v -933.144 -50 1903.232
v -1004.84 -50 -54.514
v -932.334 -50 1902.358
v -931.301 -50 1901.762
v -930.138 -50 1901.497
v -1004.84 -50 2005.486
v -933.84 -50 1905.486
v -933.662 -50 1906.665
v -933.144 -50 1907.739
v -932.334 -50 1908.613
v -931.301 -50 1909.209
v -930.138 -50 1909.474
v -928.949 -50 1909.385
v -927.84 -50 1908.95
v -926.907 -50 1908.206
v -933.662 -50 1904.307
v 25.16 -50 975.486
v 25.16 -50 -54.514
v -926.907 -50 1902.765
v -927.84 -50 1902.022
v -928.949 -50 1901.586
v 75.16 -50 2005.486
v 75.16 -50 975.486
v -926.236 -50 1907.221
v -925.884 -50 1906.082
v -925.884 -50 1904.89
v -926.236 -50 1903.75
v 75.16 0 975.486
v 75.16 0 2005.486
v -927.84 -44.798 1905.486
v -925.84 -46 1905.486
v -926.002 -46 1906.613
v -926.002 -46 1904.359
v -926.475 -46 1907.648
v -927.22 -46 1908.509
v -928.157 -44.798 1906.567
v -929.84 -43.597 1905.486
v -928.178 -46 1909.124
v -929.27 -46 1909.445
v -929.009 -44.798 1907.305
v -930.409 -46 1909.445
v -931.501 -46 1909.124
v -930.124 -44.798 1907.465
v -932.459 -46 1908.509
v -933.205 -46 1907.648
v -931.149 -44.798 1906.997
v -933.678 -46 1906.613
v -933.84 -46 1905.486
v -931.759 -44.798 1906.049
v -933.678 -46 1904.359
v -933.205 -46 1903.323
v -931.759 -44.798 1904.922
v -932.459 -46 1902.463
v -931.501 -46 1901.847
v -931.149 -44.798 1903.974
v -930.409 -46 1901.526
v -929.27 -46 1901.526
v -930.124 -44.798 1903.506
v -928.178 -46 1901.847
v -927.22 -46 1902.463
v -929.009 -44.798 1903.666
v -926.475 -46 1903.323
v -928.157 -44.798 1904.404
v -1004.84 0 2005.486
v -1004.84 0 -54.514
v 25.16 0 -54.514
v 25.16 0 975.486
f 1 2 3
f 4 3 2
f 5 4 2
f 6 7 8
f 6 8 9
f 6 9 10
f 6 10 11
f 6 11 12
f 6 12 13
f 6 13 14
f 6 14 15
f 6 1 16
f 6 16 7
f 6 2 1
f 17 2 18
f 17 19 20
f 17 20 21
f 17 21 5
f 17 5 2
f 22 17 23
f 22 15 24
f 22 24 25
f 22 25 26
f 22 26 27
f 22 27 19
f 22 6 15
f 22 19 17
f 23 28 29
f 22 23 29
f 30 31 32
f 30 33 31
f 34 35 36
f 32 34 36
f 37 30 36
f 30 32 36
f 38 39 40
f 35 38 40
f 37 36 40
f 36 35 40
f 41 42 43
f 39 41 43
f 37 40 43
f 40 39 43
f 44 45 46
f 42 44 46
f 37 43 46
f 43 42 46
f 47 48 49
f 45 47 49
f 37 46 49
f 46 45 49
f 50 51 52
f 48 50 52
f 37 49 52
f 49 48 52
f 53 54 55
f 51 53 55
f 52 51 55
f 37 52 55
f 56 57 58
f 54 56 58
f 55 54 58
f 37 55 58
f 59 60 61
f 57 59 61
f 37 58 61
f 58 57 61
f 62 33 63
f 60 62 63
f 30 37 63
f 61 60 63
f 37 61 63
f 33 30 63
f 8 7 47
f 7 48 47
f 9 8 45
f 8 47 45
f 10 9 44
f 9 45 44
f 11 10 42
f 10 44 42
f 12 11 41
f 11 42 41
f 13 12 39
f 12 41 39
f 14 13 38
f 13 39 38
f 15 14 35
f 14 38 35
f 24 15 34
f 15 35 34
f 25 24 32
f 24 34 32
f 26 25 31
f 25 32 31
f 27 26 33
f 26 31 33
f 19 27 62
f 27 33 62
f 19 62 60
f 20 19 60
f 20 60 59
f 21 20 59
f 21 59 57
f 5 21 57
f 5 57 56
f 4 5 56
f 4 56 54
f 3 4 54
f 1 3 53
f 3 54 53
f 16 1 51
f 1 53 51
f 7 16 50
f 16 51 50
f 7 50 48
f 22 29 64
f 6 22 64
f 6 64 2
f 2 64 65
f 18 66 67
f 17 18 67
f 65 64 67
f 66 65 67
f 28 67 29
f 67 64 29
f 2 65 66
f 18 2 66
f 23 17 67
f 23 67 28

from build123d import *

# Parameters (mm, degrees)
F1_DEPTH = 50
F3_D     = 8
F3_DEPTH = 4
F3_TIP   = 2.4034424761


with BuildPart() as f1:
    # F0 (on Front) → F1 (new body)
    with BuildSketch(Plane.XZ):
        Polygon((75.1604560763, 2005.4856812954), (-1004.8395439237, 2005.4856812954), (-1004.8395439237, -54.5143187046), (25.1604560763, -54.5143187046), (25.1604560763, 975.4856812954), (75.1604560763, 975.4856812954), align=None)
    extrude(amount=F1_DEPTH)

    # F3
    with Locations(Plane.XZ.offset(50)):
        with Locations((-929.8395439237, 1905.4856812954)):
            Hole(F3_D / 2, depth=F3_DEPTH)
            with Locations((0, 0, -(F3_DEPTH + F3_TIP / 2))):  # 118° drill point
                Cone(0, F3_D / 2, F3_TIP, mode=Mode.SUBTRACT)


solid = f1.part
